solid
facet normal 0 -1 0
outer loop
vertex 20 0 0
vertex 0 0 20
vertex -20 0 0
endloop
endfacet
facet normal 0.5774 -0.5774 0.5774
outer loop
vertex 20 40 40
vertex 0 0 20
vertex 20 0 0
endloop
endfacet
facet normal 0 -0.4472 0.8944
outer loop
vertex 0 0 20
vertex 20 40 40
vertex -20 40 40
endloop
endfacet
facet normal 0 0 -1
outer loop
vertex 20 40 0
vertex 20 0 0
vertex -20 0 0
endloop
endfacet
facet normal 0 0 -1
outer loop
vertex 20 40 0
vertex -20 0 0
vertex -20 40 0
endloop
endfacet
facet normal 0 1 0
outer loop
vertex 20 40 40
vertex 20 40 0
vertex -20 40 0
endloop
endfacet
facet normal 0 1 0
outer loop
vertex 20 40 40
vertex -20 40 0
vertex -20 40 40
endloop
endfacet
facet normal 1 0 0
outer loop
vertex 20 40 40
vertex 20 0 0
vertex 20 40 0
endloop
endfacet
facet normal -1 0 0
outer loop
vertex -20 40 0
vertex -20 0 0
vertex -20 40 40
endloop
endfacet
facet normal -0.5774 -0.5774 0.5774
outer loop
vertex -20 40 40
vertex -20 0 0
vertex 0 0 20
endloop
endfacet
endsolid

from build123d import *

# Parameters (mm, degrees)
F1_DEPTH = 20
F4_W     = 74.543075636
F4_H     = 79.5415919274
F5_DEPTH = 23.0950107676
F7_W     = 62.1554479003
F7_H     = 78.672291711
F8_DEPTH = 25


with BuildPart() as f1:
    # F0 (on Right) → F1 (new body, symmetric)
    with BuildSketch(Plane.YZ):
        Polygon((0, 20), (0, 0), (40, 0), (40, 40), align=None)
    extrude(amount=F1_DEPTH, both=True)

    # F4 (on 3pt) → F5 (cut, through all)
    with BuildSketch(Plane(origin=(6.6666666667, -6.6666666667, 6.6666666667), x_dir=(0.8164965809, 0.4082482905, -0.4082482905), z_dir=(0.5773502692, -0.5773502692, 0.5773502692))):
        with Locations((13.7506006286, 22.7511608973)):
            Rectangle(F4_W, F4_H)
    extrude(amount=F5_DEPTH, mode=Mode.SUBTRACT)

    # F7 (on 3pt) → F8 (cut)
    with BuildSketch(Plane(origin=(-6.6666666667, -6.6666666667, 6.6666666667), x_dir=(0.8164965809, -0.4082482905, 0.4082482905), z_dir=(-0.5773502692, -0.5773502692, 0.5773502692))):
        with Locations((-10.0513882935, 28.4373825416)):
            Rectangle(F7_W, F7_H)
    extrude(amount=F8_DEPTH, mode=Mode.SUBTRACT)


solid = f1.part
